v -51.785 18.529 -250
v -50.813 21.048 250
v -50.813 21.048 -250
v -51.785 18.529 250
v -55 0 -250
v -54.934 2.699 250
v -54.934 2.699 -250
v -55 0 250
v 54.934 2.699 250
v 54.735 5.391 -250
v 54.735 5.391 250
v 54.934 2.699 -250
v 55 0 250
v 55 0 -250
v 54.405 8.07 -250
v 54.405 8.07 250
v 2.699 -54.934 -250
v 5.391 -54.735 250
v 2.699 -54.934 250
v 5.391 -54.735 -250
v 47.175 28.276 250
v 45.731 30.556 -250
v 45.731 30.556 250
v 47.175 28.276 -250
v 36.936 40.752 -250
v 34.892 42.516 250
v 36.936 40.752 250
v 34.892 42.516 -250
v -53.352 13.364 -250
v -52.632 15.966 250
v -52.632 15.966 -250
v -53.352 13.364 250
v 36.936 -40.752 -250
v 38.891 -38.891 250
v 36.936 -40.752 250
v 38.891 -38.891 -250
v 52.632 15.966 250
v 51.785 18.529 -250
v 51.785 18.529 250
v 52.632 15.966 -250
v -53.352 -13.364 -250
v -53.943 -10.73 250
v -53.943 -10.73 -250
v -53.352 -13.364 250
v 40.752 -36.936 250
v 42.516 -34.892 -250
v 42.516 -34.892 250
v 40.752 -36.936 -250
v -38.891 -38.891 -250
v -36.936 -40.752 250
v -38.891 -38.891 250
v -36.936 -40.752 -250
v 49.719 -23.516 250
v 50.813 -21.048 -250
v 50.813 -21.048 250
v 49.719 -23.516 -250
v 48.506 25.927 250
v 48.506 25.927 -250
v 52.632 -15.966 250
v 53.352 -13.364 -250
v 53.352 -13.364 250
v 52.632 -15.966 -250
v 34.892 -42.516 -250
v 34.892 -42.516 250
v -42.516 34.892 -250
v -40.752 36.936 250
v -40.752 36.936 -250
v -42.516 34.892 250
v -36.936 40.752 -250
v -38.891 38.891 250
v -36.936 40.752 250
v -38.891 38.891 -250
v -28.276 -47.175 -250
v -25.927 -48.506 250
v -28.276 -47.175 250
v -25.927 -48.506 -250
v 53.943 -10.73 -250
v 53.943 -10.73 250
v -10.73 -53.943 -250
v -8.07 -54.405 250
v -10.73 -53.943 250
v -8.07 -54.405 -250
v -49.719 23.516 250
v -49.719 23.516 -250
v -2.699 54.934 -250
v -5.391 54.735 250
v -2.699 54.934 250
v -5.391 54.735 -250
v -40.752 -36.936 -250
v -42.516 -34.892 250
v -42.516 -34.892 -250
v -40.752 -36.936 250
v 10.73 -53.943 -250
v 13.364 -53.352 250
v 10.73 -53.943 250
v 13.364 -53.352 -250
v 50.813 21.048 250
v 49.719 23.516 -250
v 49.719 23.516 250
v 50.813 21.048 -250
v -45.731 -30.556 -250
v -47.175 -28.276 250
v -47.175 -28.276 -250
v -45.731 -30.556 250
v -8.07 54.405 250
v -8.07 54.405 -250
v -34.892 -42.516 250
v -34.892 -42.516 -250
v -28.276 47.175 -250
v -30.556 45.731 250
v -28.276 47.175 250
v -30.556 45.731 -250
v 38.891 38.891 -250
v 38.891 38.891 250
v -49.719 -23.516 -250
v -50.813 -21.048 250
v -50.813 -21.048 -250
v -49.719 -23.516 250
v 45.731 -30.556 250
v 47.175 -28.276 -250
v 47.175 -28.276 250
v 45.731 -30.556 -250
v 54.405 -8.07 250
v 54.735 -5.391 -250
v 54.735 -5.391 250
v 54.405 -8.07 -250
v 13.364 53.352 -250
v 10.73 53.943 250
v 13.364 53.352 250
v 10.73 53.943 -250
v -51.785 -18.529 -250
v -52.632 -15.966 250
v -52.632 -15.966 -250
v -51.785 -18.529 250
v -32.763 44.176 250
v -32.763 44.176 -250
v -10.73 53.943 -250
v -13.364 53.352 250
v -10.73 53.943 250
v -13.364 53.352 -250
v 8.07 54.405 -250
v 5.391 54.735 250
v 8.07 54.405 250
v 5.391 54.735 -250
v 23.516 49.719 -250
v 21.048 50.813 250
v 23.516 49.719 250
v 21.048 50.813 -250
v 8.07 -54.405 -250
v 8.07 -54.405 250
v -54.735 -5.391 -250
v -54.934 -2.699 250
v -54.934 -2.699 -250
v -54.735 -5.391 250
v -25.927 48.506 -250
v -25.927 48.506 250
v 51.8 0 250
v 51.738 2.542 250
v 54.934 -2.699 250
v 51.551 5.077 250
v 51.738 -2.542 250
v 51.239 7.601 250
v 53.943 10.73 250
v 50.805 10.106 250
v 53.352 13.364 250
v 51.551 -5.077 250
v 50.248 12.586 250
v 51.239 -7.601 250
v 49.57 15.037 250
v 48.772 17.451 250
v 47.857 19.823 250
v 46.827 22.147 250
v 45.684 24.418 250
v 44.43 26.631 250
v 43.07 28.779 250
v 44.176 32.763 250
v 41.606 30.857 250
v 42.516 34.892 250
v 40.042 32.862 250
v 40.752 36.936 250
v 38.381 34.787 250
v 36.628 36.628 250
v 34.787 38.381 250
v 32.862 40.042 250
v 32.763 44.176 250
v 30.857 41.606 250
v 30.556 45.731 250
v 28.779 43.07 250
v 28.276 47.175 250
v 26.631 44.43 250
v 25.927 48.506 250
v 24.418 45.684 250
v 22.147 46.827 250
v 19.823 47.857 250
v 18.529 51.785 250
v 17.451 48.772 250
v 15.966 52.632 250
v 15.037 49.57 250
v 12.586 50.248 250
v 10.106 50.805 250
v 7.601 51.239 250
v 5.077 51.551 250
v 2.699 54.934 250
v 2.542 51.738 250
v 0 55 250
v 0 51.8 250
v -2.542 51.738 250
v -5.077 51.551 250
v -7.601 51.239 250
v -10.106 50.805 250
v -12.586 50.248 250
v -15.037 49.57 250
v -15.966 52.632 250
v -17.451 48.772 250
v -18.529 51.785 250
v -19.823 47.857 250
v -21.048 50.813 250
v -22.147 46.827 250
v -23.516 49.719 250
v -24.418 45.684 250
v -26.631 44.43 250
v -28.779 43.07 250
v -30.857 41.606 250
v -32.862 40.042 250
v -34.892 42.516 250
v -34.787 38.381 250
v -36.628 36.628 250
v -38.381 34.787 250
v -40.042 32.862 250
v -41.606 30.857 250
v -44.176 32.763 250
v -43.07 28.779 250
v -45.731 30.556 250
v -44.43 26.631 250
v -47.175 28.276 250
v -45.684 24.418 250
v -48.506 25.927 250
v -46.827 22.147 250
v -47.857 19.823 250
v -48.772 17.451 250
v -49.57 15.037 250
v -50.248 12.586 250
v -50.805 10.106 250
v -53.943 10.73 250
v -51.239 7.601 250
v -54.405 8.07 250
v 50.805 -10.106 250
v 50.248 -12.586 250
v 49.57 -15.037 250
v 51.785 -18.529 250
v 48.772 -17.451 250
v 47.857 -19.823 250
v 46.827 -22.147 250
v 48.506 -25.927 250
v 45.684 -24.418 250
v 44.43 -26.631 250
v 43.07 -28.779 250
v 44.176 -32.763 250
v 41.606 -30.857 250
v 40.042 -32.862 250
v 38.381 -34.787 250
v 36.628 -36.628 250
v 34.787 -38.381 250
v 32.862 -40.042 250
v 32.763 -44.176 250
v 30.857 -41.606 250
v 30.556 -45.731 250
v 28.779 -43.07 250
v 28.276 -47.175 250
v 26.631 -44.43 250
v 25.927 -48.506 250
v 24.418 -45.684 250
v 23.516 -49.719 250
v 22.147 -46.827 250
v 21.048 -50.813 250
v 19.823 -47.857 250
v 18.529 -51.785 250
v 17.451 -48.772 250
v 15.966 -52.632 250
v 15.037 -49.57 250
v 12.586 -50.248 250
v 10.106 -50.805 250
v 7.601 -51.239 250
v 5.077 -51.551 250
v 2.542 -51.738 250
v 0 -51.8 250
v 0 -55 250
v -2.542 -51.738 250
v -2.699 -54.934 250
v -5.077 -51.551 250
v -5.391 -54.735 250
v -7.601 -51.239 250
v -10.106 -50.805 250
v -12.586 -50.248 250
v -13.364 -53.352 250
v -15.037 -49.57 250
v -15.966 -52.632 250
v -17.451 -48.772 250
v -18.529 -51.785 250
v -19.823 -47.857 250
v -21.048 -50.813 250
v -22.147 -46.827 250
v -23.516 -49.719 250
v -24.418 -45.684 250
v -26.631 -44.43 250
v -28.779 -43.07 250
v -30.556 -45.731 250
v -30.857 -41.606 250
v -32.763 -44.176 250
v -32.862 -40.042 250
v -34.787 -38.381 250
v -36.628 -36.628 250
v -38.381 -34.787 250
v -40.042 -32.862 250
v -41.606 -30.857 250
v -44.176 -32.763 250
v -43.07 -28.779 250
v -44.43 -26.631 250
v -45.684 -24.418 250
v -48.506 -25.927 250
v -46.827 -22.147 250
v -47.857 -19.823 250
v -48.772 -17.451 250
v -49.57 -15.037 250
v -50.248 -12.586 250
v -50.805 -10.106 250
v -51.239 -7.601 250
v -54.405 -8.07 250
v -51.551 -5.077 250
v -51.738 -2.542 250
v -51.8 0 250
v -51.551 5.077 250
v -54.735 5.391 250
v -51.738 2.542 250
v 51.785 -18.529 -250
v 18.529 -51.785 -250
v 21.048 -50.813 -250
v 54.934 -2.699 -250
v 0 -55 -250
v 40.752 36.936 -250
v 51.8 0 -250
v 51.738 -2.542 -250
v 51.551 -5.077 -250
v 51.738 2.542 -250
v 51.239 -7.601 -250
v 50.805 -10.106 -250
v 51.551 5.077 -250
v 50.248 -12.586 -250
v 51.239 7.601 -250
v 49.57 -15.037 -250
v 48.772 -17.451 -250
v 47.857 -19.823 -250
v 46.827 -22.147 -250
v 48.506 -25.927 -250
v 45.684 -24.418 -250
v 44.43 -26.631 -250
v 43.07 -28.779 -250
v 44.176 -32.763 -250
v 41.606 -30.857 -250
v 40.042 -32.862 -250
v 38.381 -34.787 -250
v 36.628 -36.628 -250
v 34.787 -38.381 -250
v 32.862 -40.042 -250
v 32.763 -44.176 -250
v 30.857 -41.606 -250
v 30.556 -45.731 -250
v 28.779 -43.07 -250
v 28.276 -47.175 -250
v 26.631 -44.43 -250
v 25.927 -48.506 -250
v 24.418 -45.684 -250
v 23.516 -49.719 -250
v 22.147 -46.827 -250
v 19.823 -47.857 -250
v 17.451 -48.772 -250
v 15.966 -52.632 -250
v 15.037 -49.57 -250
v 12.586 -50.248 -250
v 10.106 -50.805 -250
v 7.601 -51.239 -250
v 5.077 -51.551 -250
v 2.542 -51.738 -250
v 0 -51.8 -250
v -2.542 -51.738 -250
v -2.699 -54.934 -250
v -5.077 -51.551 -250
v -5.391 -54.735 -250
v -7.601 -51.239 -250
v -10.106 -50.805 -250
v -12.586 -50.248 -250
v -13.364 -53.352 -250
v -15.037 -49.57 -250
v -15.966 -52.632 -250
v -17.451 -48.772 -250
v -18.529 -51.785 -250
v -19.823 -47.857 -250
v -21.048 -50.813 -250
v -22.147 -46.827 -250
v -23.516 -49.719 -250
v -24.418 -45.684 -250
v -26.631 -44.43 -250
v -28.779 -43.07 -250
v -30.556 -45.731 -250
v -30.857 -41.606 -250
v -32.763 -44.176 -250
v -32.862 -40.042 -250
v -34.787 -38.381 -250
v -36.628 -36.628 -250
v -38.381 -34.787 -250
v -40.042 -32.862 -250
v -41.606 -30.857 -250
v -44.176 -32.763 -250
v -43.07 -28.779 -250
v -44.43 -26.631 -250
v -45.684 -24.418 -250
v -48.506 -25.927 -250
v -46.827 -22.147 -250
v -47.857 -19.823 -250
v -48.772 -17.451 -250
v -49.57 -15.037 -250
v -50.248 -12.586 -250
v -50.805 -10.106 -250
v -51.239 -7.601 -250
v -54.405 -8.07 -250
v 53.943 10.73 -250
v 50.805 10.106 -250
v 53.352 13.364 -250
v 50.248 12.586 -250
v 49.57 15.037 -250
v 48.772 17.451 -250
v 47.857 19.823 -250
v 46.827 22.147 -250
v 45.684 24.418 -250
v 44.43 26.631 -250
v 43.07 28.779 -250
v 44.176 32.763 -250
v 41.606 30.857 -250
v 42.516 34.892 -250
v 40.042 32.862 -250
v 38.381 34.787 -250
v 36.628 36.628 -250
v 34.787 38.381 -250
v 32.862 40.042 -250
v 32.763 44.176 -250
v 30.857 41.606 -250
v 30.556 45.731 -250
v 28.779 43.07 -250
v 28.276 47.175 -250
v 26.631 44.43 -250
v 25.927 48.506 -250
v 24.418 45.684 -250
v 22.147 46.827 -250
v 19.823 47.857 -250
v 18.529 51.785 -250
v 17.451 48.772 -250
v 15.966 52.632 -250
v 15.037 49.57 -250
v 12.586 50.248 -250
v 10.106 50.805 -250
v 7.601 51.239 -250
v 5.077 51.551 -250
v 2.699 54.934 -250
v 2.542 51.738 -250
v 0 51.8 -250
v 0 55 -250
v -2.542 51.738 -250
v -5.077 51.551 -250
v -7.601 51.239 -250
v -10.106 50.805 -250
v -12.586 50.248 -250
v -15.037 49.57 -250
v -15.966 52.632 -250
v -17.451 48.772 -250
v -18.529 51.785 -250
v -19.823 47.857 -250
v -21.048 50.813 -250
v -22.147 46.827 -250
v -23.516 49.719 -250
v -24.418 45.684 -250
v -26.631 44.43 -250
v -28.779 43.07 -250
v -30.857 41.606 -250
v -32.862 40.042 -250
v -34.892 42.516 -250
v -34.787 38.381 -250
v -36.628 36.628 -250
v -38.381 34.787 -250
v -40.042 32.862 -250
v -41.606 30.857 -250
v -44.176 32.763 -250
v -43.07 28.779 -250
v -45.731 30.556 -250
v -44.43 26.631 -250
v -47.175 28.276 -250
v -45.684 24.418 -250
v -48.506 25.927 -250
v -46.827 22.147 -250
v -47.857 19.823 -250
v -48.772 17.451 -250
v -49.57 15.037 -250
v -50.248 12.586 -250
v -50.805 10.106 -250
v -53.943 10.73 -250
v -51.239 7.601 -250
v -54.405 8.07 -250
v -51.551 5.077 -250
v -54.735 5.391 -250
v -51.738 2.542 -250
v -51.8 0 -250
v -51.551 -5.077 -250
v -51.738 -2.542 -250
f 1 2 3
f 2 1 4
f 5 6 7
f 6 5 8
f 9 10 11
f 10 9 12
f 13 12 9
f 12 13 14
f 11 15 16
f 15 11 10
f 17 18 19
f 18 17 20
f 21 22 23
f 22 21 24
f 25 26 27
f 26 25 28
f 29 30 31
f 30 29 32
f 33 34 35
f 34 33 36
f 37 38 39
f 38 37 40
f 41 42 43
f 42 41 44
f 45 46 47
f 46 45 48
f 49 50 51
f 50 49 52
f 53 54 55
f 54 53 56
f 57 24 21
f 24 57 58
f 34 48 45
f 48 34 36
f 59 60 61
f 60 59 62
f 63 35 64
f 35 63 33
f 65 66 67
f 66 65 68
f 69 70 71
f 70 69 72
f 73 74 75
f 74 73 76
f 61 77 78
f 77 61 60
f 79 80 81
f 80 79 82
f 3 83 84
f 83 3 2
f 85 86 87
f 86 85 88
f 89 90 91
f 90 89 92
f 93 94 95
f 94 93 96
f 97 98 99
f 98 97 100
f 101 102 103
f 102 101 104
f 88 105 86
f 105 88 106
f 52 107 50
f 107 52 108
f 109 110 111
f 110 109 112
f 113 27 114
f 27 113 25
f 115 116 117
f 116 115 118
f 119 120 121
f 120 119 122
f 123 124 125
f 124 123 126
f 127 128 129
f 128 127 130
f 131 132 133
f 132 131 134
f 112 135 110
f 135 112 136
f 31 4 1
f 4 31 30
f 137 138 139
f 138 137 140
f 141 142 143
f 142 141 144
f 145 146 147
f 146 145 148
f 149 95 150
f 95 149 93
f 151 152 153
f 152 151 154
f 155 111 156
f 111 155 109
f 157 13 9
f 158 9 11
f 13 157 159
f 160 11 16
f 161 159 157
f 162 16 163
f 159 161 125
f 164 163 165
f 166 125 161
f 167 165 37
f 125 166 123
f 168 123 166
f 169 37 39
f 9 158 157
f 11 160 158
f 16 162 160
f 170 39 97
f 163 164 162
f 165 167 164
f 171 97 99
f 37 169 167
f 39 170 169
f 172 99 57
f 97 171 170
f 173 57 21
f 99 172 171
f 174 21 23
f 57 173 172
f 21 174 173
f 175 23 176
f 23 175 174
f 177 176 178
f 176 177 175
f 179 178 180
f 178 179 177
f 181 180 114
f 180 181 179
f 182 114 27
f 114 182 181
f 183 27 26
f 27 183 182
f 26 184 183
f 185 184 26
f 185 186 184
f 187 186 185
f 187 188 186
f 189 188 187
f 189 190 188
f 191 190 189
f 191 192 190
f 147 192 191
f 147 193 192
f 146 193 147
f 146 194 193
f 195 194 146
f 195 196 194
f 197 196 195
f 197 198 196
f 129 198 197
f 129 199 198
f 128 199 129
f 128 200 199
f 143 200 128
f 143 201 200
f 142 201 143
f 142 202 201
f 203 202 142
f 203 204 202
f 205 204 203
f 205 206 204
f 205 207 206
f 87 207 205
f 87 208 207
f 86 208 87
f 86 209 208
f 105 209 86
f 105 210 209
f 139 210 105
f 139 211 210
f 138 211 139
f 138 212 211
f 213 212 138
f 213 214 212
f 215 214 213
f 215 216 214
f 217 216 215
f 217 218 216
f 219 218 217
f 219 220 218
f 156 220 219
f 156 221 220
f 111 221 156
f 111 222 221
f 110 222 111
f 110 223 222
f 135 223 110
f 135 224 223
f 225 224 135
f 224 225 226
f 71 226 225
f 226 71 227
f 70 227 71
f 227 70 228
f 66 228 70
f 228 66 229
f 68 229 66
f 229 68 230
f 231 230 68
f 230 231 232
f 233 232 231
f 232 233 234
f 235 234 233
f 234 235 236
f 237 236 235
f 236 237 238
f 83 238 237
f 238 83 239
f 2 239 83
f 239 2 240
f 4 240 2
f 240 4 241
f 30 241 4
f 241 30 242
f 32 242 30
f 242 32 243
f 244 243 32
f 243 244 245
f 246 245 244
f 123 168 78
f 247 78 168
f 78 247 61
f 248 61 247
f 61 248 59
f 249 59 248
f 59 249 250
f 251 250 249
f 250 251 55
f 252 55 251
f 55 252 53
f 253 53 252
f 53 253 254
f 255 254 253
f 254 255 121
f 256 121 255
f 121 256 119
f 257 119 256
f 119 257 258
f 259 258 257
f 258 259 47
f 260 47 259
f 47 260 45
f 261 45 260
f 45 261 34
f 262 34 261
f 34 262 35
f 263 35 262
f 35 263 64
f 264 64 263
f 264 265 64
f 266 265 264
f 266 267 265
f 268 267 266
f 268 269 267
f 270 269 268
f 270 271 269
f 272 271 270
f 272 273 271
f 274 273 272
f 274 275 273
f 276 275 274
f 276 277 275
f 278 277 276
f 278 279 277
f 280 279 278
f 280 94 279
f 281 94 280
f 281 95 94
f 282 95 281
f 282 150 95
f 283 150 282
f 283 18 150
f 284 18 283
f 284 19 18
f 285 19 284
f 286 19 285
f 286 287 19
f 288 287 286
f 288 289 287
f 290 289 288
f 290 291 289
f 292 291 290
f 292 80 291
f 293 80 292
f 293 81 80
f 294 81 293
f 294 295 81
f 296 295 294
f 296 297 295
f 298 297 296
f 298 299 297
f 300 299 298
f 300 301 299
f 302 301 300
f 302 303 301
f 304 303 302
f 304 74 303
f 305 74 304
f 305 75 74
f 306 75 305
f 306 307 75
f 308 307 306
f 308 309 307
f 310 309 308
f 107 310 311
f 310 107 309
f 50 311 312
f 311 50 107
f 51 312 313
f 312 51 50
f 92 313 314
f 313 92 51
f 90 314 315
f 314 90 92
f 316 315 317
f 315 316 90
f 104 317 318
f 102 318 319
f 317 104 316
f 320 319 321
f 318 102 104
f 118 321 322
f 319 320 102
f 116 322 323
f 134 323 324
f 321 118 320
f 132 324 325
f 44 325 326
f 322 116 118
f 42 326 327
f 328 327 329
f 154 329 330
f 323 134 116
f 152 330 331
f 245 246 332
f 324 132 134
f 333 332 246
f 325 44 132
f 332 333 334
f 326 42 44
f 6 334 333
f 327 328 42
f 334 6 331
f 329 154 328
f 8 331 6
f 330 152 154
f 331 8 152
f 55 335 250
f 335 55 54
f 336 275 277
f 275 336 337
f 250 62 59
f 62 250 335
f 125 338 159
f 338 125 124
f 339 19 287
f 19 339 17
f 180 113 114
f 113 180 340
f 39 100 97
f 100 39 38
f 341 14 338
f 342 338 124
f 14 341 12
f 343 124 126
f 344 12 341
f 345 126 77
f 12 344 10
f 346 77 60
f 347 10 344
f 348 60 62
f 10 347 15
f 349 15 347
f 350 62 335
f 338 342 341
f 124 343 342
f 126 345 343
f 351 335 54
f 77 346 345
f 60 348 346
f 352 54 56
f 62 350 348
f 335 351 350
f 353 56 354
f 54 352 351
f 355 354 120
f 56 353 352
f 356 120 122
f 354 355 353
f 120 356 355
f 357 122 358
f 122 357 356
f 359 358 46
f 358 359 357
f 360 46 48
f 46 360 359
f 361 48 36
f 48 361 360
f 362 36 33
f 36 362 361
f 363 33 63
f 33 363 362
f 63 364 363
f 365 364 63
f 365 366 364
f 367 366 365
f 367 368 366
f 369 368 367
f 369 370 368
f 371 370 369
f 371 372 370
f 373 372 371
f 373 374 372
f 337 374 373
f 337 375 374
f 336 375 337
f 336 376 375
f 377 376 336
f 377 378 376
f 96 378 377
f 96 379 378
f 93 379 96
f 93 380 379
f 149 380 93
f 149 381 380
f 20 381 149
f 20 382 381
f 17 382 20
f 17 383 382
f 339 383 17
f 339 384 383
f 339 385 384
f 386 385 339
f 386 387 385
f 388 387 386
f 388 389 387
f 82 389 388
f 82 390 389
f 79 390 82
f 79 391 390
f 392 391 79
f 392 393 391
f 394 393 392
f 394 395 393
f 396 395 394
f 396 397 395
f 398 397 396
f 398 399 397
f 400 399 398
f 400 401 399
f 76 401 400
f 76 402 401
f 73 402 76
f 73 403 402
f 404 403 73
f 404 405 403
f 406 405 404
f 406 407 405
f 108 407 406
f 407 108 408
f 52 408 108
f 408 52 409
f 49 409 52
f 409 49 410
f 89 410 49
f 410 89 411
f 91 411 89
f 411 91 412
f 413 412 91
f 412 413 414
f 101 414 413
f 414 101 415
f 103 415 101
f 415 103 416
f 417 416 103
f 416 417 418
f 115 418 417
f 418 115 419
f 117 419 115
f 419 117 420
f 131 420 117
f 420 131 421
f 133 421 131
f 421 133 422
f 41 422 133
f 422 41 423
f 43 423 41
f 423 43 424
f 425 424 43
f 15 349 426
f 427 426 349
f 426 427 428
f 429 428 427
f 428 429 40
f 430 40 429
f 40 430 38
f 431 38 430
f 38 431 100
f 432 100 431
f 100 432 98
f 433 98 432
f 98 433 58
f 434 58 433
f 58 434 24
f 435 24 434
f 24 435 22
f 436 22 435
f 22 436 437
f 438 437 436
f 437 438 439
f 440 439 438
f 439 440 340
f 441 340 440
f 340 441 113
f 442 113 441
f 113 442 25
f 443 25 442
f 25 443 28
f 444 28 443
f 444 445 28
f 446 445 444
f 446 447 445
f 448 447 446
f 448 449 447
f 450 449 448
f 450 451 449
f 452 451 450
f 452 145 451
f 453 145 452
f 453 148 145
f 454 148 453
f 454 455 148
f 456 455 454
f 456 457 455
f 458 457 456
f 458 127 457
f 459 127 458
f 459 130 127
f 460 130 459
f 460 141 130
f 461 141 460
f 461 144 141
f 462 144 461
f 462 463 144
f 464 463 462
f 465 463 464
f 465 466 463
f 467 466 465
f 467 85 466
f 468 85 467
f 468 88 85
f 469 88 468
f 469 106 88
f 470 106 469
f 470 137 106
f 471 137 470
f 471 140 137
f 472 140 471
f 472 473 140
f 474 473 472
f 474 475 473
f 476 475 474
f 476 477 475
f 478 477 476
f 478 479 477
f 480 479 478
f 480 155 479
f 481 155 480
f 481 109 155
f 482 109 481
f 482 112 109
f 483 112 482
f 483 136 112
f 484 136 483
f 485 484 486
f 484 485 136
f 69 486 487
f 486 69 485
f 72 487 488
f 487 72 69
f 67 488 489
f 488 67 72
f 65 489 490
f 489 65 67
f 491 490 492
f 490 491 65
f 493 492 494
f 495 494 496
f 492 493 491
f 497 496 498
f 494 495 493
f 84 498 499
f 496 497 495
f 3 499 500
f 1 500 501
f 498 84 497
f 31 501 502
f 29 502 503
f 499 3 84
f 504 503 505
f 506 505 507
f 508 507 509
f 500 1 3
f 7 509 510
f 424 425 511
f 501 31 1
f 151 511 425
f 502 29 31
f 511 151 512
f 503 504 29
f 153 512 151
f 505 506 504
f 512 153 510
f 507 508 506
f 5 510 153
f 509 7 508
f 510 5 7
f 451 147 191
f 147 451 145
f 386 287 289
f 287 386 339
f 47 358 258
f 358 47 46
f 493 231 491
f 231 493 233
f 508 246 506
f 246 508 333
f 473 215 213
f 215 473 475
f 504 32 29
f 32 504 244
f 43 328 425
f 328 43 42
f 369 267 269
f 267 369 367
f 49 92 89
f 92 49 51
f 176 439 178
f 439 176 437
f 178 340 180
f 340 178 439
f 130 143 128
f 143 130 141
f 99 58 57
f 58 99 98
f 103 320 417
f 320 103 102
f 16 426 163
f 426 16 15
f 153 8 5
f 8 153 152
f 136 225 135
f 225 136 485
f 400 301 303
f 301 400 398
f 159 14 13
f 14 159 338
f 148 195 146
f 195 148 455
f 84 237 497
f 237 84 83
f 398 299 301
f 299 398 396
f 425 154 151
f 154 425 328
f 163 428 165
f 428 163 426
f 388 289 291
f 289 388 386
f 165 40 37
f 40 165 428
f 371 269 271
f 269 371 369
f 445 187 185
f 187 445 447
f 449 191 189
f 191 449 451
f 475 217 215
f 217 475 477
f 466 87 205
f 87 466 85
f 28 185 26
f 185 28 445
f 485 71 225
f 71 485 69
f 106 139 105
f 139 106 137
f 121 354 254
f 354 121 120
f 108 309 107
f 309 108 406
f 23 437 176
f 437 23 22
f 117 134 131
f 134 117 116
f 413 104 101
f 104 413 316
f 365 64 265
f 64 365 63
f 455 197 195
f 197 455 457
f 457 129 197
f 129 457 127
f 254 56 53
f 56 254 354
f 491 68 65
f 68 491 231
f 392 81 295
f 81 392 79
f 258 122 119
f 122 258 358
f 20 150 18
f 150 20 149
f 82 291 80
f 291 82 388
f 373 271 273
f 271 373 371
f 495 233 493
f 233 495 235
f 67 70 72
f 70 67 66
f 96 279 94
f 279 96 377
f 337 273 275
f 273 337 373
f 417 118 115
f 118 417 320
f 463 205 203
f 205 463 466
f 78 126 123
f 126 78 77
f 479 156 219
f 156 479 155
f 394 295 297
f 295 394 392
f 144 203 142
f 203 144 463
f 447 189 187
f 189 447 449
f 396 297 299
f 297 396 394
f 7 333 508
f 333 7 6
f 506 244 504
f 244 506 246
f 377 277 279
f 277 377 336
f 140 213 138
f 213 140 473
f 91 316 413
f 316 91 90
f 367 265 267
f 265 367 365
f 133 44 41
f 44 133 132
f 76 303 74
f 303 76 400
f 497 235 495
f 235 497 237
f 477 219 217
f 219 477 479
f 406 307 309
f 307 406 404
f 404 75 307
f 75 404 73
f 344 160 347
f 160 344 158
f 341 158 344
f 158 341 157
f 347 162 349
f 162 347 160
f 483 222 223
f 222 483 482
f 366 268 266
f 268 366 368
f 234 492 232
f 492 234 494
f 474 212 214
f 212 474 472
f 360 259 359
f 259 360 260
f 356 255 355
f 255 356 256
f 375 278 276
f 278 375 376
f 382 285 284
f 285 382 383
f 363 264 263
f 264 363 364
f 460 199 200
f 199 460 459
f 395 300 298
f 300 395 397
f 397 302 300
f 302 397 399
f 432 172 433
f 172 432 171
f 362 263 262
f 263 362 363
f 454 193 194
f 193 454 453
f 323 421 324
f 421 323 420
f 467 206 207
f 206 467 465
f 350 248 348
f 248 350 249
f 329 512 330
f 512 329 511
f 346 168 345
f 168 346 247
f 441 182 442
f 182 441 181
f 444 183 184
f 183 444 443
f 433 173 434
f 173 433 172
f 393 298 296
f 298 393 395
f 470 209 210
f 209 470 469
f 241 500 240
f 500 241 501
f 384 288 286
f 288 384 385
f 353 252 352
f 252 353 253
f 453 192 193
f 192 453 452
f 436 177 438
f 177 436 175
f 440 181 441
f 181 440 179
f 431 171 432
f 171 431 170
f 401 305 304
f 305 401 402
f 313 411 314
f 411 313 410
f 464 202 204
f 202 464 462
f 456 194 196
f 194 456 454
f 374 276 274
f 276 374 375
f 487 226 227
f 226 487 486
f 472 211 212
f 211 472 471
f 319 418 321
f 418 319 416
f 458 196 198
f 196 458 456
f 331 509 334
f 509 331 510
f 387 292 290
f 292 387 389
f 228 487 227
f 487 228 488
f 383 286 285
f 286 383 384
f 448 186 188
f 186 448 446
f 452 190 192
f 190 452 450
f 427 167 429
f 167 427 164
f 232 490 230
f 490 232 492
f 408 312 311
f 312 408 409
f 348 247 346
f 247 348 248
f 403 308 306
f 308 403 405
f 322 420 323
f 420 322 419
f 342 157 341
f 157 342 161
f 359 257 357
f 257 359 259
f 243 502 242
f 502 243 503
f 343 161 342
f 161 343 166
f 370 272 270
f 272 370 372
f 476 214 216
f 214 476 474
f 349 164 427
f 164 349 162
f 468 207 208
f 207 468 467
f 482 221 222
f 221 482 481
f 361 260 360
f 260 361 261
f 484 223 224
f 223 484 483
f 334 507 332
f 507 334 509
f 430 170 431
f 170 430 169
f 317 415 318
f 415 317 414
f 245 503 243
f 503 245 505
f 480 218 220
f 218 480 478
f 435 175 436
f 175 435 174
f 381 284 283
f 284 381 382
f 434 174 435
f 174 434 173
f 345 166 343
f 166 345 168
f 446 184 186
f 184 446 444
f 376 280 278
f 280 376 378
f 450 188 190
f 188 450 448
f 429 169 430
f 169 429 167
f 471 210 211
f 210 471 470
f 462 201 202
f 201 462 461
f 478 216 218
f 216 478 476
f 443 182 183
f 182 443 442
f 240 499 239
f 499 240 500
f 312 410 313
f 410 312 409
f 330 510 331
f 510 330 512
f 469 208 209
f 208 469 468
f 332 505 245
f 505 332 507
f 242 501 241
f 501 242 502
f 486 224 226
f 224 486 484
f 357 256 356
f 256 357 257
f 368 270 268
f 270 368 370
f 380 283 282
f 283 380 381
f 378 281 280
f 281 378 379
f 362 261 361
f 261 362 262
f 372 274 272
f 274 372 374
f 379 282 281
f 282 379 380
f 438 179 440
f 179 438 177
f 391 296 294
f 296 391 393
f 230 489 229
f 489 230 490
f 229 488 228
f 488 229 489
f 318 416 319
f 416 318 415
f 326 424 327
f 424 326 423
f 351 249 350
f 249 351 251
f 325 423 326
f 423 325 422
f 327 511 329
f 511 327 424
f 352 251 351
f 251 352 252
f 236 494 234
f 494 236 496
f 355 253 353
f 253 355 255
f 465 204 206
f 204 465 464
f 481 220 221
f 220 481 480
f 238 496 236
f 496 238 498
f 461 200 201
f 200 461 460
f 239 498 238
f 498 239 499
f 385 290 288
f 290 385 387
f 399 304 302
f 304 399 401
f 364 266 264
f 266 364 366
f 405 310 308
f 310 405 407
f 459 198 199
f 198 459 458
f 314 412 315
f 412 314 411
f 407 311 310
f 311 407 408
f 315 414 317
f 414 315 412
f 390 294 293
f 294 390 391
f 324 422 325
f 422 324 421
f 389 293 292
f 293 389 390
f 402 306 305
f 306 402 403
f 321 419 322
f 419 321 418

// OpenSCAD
$fn=128;

module ht_pipe(od=110, length=500, wall=3.2) {
    difference() {
        cylinder(h=length, d=od, center=true);
        cylinder(h=length+2, d=od-2*wall, center=true);
    }
}

ht_pipe(od=110, length=500, wall=3.2);
